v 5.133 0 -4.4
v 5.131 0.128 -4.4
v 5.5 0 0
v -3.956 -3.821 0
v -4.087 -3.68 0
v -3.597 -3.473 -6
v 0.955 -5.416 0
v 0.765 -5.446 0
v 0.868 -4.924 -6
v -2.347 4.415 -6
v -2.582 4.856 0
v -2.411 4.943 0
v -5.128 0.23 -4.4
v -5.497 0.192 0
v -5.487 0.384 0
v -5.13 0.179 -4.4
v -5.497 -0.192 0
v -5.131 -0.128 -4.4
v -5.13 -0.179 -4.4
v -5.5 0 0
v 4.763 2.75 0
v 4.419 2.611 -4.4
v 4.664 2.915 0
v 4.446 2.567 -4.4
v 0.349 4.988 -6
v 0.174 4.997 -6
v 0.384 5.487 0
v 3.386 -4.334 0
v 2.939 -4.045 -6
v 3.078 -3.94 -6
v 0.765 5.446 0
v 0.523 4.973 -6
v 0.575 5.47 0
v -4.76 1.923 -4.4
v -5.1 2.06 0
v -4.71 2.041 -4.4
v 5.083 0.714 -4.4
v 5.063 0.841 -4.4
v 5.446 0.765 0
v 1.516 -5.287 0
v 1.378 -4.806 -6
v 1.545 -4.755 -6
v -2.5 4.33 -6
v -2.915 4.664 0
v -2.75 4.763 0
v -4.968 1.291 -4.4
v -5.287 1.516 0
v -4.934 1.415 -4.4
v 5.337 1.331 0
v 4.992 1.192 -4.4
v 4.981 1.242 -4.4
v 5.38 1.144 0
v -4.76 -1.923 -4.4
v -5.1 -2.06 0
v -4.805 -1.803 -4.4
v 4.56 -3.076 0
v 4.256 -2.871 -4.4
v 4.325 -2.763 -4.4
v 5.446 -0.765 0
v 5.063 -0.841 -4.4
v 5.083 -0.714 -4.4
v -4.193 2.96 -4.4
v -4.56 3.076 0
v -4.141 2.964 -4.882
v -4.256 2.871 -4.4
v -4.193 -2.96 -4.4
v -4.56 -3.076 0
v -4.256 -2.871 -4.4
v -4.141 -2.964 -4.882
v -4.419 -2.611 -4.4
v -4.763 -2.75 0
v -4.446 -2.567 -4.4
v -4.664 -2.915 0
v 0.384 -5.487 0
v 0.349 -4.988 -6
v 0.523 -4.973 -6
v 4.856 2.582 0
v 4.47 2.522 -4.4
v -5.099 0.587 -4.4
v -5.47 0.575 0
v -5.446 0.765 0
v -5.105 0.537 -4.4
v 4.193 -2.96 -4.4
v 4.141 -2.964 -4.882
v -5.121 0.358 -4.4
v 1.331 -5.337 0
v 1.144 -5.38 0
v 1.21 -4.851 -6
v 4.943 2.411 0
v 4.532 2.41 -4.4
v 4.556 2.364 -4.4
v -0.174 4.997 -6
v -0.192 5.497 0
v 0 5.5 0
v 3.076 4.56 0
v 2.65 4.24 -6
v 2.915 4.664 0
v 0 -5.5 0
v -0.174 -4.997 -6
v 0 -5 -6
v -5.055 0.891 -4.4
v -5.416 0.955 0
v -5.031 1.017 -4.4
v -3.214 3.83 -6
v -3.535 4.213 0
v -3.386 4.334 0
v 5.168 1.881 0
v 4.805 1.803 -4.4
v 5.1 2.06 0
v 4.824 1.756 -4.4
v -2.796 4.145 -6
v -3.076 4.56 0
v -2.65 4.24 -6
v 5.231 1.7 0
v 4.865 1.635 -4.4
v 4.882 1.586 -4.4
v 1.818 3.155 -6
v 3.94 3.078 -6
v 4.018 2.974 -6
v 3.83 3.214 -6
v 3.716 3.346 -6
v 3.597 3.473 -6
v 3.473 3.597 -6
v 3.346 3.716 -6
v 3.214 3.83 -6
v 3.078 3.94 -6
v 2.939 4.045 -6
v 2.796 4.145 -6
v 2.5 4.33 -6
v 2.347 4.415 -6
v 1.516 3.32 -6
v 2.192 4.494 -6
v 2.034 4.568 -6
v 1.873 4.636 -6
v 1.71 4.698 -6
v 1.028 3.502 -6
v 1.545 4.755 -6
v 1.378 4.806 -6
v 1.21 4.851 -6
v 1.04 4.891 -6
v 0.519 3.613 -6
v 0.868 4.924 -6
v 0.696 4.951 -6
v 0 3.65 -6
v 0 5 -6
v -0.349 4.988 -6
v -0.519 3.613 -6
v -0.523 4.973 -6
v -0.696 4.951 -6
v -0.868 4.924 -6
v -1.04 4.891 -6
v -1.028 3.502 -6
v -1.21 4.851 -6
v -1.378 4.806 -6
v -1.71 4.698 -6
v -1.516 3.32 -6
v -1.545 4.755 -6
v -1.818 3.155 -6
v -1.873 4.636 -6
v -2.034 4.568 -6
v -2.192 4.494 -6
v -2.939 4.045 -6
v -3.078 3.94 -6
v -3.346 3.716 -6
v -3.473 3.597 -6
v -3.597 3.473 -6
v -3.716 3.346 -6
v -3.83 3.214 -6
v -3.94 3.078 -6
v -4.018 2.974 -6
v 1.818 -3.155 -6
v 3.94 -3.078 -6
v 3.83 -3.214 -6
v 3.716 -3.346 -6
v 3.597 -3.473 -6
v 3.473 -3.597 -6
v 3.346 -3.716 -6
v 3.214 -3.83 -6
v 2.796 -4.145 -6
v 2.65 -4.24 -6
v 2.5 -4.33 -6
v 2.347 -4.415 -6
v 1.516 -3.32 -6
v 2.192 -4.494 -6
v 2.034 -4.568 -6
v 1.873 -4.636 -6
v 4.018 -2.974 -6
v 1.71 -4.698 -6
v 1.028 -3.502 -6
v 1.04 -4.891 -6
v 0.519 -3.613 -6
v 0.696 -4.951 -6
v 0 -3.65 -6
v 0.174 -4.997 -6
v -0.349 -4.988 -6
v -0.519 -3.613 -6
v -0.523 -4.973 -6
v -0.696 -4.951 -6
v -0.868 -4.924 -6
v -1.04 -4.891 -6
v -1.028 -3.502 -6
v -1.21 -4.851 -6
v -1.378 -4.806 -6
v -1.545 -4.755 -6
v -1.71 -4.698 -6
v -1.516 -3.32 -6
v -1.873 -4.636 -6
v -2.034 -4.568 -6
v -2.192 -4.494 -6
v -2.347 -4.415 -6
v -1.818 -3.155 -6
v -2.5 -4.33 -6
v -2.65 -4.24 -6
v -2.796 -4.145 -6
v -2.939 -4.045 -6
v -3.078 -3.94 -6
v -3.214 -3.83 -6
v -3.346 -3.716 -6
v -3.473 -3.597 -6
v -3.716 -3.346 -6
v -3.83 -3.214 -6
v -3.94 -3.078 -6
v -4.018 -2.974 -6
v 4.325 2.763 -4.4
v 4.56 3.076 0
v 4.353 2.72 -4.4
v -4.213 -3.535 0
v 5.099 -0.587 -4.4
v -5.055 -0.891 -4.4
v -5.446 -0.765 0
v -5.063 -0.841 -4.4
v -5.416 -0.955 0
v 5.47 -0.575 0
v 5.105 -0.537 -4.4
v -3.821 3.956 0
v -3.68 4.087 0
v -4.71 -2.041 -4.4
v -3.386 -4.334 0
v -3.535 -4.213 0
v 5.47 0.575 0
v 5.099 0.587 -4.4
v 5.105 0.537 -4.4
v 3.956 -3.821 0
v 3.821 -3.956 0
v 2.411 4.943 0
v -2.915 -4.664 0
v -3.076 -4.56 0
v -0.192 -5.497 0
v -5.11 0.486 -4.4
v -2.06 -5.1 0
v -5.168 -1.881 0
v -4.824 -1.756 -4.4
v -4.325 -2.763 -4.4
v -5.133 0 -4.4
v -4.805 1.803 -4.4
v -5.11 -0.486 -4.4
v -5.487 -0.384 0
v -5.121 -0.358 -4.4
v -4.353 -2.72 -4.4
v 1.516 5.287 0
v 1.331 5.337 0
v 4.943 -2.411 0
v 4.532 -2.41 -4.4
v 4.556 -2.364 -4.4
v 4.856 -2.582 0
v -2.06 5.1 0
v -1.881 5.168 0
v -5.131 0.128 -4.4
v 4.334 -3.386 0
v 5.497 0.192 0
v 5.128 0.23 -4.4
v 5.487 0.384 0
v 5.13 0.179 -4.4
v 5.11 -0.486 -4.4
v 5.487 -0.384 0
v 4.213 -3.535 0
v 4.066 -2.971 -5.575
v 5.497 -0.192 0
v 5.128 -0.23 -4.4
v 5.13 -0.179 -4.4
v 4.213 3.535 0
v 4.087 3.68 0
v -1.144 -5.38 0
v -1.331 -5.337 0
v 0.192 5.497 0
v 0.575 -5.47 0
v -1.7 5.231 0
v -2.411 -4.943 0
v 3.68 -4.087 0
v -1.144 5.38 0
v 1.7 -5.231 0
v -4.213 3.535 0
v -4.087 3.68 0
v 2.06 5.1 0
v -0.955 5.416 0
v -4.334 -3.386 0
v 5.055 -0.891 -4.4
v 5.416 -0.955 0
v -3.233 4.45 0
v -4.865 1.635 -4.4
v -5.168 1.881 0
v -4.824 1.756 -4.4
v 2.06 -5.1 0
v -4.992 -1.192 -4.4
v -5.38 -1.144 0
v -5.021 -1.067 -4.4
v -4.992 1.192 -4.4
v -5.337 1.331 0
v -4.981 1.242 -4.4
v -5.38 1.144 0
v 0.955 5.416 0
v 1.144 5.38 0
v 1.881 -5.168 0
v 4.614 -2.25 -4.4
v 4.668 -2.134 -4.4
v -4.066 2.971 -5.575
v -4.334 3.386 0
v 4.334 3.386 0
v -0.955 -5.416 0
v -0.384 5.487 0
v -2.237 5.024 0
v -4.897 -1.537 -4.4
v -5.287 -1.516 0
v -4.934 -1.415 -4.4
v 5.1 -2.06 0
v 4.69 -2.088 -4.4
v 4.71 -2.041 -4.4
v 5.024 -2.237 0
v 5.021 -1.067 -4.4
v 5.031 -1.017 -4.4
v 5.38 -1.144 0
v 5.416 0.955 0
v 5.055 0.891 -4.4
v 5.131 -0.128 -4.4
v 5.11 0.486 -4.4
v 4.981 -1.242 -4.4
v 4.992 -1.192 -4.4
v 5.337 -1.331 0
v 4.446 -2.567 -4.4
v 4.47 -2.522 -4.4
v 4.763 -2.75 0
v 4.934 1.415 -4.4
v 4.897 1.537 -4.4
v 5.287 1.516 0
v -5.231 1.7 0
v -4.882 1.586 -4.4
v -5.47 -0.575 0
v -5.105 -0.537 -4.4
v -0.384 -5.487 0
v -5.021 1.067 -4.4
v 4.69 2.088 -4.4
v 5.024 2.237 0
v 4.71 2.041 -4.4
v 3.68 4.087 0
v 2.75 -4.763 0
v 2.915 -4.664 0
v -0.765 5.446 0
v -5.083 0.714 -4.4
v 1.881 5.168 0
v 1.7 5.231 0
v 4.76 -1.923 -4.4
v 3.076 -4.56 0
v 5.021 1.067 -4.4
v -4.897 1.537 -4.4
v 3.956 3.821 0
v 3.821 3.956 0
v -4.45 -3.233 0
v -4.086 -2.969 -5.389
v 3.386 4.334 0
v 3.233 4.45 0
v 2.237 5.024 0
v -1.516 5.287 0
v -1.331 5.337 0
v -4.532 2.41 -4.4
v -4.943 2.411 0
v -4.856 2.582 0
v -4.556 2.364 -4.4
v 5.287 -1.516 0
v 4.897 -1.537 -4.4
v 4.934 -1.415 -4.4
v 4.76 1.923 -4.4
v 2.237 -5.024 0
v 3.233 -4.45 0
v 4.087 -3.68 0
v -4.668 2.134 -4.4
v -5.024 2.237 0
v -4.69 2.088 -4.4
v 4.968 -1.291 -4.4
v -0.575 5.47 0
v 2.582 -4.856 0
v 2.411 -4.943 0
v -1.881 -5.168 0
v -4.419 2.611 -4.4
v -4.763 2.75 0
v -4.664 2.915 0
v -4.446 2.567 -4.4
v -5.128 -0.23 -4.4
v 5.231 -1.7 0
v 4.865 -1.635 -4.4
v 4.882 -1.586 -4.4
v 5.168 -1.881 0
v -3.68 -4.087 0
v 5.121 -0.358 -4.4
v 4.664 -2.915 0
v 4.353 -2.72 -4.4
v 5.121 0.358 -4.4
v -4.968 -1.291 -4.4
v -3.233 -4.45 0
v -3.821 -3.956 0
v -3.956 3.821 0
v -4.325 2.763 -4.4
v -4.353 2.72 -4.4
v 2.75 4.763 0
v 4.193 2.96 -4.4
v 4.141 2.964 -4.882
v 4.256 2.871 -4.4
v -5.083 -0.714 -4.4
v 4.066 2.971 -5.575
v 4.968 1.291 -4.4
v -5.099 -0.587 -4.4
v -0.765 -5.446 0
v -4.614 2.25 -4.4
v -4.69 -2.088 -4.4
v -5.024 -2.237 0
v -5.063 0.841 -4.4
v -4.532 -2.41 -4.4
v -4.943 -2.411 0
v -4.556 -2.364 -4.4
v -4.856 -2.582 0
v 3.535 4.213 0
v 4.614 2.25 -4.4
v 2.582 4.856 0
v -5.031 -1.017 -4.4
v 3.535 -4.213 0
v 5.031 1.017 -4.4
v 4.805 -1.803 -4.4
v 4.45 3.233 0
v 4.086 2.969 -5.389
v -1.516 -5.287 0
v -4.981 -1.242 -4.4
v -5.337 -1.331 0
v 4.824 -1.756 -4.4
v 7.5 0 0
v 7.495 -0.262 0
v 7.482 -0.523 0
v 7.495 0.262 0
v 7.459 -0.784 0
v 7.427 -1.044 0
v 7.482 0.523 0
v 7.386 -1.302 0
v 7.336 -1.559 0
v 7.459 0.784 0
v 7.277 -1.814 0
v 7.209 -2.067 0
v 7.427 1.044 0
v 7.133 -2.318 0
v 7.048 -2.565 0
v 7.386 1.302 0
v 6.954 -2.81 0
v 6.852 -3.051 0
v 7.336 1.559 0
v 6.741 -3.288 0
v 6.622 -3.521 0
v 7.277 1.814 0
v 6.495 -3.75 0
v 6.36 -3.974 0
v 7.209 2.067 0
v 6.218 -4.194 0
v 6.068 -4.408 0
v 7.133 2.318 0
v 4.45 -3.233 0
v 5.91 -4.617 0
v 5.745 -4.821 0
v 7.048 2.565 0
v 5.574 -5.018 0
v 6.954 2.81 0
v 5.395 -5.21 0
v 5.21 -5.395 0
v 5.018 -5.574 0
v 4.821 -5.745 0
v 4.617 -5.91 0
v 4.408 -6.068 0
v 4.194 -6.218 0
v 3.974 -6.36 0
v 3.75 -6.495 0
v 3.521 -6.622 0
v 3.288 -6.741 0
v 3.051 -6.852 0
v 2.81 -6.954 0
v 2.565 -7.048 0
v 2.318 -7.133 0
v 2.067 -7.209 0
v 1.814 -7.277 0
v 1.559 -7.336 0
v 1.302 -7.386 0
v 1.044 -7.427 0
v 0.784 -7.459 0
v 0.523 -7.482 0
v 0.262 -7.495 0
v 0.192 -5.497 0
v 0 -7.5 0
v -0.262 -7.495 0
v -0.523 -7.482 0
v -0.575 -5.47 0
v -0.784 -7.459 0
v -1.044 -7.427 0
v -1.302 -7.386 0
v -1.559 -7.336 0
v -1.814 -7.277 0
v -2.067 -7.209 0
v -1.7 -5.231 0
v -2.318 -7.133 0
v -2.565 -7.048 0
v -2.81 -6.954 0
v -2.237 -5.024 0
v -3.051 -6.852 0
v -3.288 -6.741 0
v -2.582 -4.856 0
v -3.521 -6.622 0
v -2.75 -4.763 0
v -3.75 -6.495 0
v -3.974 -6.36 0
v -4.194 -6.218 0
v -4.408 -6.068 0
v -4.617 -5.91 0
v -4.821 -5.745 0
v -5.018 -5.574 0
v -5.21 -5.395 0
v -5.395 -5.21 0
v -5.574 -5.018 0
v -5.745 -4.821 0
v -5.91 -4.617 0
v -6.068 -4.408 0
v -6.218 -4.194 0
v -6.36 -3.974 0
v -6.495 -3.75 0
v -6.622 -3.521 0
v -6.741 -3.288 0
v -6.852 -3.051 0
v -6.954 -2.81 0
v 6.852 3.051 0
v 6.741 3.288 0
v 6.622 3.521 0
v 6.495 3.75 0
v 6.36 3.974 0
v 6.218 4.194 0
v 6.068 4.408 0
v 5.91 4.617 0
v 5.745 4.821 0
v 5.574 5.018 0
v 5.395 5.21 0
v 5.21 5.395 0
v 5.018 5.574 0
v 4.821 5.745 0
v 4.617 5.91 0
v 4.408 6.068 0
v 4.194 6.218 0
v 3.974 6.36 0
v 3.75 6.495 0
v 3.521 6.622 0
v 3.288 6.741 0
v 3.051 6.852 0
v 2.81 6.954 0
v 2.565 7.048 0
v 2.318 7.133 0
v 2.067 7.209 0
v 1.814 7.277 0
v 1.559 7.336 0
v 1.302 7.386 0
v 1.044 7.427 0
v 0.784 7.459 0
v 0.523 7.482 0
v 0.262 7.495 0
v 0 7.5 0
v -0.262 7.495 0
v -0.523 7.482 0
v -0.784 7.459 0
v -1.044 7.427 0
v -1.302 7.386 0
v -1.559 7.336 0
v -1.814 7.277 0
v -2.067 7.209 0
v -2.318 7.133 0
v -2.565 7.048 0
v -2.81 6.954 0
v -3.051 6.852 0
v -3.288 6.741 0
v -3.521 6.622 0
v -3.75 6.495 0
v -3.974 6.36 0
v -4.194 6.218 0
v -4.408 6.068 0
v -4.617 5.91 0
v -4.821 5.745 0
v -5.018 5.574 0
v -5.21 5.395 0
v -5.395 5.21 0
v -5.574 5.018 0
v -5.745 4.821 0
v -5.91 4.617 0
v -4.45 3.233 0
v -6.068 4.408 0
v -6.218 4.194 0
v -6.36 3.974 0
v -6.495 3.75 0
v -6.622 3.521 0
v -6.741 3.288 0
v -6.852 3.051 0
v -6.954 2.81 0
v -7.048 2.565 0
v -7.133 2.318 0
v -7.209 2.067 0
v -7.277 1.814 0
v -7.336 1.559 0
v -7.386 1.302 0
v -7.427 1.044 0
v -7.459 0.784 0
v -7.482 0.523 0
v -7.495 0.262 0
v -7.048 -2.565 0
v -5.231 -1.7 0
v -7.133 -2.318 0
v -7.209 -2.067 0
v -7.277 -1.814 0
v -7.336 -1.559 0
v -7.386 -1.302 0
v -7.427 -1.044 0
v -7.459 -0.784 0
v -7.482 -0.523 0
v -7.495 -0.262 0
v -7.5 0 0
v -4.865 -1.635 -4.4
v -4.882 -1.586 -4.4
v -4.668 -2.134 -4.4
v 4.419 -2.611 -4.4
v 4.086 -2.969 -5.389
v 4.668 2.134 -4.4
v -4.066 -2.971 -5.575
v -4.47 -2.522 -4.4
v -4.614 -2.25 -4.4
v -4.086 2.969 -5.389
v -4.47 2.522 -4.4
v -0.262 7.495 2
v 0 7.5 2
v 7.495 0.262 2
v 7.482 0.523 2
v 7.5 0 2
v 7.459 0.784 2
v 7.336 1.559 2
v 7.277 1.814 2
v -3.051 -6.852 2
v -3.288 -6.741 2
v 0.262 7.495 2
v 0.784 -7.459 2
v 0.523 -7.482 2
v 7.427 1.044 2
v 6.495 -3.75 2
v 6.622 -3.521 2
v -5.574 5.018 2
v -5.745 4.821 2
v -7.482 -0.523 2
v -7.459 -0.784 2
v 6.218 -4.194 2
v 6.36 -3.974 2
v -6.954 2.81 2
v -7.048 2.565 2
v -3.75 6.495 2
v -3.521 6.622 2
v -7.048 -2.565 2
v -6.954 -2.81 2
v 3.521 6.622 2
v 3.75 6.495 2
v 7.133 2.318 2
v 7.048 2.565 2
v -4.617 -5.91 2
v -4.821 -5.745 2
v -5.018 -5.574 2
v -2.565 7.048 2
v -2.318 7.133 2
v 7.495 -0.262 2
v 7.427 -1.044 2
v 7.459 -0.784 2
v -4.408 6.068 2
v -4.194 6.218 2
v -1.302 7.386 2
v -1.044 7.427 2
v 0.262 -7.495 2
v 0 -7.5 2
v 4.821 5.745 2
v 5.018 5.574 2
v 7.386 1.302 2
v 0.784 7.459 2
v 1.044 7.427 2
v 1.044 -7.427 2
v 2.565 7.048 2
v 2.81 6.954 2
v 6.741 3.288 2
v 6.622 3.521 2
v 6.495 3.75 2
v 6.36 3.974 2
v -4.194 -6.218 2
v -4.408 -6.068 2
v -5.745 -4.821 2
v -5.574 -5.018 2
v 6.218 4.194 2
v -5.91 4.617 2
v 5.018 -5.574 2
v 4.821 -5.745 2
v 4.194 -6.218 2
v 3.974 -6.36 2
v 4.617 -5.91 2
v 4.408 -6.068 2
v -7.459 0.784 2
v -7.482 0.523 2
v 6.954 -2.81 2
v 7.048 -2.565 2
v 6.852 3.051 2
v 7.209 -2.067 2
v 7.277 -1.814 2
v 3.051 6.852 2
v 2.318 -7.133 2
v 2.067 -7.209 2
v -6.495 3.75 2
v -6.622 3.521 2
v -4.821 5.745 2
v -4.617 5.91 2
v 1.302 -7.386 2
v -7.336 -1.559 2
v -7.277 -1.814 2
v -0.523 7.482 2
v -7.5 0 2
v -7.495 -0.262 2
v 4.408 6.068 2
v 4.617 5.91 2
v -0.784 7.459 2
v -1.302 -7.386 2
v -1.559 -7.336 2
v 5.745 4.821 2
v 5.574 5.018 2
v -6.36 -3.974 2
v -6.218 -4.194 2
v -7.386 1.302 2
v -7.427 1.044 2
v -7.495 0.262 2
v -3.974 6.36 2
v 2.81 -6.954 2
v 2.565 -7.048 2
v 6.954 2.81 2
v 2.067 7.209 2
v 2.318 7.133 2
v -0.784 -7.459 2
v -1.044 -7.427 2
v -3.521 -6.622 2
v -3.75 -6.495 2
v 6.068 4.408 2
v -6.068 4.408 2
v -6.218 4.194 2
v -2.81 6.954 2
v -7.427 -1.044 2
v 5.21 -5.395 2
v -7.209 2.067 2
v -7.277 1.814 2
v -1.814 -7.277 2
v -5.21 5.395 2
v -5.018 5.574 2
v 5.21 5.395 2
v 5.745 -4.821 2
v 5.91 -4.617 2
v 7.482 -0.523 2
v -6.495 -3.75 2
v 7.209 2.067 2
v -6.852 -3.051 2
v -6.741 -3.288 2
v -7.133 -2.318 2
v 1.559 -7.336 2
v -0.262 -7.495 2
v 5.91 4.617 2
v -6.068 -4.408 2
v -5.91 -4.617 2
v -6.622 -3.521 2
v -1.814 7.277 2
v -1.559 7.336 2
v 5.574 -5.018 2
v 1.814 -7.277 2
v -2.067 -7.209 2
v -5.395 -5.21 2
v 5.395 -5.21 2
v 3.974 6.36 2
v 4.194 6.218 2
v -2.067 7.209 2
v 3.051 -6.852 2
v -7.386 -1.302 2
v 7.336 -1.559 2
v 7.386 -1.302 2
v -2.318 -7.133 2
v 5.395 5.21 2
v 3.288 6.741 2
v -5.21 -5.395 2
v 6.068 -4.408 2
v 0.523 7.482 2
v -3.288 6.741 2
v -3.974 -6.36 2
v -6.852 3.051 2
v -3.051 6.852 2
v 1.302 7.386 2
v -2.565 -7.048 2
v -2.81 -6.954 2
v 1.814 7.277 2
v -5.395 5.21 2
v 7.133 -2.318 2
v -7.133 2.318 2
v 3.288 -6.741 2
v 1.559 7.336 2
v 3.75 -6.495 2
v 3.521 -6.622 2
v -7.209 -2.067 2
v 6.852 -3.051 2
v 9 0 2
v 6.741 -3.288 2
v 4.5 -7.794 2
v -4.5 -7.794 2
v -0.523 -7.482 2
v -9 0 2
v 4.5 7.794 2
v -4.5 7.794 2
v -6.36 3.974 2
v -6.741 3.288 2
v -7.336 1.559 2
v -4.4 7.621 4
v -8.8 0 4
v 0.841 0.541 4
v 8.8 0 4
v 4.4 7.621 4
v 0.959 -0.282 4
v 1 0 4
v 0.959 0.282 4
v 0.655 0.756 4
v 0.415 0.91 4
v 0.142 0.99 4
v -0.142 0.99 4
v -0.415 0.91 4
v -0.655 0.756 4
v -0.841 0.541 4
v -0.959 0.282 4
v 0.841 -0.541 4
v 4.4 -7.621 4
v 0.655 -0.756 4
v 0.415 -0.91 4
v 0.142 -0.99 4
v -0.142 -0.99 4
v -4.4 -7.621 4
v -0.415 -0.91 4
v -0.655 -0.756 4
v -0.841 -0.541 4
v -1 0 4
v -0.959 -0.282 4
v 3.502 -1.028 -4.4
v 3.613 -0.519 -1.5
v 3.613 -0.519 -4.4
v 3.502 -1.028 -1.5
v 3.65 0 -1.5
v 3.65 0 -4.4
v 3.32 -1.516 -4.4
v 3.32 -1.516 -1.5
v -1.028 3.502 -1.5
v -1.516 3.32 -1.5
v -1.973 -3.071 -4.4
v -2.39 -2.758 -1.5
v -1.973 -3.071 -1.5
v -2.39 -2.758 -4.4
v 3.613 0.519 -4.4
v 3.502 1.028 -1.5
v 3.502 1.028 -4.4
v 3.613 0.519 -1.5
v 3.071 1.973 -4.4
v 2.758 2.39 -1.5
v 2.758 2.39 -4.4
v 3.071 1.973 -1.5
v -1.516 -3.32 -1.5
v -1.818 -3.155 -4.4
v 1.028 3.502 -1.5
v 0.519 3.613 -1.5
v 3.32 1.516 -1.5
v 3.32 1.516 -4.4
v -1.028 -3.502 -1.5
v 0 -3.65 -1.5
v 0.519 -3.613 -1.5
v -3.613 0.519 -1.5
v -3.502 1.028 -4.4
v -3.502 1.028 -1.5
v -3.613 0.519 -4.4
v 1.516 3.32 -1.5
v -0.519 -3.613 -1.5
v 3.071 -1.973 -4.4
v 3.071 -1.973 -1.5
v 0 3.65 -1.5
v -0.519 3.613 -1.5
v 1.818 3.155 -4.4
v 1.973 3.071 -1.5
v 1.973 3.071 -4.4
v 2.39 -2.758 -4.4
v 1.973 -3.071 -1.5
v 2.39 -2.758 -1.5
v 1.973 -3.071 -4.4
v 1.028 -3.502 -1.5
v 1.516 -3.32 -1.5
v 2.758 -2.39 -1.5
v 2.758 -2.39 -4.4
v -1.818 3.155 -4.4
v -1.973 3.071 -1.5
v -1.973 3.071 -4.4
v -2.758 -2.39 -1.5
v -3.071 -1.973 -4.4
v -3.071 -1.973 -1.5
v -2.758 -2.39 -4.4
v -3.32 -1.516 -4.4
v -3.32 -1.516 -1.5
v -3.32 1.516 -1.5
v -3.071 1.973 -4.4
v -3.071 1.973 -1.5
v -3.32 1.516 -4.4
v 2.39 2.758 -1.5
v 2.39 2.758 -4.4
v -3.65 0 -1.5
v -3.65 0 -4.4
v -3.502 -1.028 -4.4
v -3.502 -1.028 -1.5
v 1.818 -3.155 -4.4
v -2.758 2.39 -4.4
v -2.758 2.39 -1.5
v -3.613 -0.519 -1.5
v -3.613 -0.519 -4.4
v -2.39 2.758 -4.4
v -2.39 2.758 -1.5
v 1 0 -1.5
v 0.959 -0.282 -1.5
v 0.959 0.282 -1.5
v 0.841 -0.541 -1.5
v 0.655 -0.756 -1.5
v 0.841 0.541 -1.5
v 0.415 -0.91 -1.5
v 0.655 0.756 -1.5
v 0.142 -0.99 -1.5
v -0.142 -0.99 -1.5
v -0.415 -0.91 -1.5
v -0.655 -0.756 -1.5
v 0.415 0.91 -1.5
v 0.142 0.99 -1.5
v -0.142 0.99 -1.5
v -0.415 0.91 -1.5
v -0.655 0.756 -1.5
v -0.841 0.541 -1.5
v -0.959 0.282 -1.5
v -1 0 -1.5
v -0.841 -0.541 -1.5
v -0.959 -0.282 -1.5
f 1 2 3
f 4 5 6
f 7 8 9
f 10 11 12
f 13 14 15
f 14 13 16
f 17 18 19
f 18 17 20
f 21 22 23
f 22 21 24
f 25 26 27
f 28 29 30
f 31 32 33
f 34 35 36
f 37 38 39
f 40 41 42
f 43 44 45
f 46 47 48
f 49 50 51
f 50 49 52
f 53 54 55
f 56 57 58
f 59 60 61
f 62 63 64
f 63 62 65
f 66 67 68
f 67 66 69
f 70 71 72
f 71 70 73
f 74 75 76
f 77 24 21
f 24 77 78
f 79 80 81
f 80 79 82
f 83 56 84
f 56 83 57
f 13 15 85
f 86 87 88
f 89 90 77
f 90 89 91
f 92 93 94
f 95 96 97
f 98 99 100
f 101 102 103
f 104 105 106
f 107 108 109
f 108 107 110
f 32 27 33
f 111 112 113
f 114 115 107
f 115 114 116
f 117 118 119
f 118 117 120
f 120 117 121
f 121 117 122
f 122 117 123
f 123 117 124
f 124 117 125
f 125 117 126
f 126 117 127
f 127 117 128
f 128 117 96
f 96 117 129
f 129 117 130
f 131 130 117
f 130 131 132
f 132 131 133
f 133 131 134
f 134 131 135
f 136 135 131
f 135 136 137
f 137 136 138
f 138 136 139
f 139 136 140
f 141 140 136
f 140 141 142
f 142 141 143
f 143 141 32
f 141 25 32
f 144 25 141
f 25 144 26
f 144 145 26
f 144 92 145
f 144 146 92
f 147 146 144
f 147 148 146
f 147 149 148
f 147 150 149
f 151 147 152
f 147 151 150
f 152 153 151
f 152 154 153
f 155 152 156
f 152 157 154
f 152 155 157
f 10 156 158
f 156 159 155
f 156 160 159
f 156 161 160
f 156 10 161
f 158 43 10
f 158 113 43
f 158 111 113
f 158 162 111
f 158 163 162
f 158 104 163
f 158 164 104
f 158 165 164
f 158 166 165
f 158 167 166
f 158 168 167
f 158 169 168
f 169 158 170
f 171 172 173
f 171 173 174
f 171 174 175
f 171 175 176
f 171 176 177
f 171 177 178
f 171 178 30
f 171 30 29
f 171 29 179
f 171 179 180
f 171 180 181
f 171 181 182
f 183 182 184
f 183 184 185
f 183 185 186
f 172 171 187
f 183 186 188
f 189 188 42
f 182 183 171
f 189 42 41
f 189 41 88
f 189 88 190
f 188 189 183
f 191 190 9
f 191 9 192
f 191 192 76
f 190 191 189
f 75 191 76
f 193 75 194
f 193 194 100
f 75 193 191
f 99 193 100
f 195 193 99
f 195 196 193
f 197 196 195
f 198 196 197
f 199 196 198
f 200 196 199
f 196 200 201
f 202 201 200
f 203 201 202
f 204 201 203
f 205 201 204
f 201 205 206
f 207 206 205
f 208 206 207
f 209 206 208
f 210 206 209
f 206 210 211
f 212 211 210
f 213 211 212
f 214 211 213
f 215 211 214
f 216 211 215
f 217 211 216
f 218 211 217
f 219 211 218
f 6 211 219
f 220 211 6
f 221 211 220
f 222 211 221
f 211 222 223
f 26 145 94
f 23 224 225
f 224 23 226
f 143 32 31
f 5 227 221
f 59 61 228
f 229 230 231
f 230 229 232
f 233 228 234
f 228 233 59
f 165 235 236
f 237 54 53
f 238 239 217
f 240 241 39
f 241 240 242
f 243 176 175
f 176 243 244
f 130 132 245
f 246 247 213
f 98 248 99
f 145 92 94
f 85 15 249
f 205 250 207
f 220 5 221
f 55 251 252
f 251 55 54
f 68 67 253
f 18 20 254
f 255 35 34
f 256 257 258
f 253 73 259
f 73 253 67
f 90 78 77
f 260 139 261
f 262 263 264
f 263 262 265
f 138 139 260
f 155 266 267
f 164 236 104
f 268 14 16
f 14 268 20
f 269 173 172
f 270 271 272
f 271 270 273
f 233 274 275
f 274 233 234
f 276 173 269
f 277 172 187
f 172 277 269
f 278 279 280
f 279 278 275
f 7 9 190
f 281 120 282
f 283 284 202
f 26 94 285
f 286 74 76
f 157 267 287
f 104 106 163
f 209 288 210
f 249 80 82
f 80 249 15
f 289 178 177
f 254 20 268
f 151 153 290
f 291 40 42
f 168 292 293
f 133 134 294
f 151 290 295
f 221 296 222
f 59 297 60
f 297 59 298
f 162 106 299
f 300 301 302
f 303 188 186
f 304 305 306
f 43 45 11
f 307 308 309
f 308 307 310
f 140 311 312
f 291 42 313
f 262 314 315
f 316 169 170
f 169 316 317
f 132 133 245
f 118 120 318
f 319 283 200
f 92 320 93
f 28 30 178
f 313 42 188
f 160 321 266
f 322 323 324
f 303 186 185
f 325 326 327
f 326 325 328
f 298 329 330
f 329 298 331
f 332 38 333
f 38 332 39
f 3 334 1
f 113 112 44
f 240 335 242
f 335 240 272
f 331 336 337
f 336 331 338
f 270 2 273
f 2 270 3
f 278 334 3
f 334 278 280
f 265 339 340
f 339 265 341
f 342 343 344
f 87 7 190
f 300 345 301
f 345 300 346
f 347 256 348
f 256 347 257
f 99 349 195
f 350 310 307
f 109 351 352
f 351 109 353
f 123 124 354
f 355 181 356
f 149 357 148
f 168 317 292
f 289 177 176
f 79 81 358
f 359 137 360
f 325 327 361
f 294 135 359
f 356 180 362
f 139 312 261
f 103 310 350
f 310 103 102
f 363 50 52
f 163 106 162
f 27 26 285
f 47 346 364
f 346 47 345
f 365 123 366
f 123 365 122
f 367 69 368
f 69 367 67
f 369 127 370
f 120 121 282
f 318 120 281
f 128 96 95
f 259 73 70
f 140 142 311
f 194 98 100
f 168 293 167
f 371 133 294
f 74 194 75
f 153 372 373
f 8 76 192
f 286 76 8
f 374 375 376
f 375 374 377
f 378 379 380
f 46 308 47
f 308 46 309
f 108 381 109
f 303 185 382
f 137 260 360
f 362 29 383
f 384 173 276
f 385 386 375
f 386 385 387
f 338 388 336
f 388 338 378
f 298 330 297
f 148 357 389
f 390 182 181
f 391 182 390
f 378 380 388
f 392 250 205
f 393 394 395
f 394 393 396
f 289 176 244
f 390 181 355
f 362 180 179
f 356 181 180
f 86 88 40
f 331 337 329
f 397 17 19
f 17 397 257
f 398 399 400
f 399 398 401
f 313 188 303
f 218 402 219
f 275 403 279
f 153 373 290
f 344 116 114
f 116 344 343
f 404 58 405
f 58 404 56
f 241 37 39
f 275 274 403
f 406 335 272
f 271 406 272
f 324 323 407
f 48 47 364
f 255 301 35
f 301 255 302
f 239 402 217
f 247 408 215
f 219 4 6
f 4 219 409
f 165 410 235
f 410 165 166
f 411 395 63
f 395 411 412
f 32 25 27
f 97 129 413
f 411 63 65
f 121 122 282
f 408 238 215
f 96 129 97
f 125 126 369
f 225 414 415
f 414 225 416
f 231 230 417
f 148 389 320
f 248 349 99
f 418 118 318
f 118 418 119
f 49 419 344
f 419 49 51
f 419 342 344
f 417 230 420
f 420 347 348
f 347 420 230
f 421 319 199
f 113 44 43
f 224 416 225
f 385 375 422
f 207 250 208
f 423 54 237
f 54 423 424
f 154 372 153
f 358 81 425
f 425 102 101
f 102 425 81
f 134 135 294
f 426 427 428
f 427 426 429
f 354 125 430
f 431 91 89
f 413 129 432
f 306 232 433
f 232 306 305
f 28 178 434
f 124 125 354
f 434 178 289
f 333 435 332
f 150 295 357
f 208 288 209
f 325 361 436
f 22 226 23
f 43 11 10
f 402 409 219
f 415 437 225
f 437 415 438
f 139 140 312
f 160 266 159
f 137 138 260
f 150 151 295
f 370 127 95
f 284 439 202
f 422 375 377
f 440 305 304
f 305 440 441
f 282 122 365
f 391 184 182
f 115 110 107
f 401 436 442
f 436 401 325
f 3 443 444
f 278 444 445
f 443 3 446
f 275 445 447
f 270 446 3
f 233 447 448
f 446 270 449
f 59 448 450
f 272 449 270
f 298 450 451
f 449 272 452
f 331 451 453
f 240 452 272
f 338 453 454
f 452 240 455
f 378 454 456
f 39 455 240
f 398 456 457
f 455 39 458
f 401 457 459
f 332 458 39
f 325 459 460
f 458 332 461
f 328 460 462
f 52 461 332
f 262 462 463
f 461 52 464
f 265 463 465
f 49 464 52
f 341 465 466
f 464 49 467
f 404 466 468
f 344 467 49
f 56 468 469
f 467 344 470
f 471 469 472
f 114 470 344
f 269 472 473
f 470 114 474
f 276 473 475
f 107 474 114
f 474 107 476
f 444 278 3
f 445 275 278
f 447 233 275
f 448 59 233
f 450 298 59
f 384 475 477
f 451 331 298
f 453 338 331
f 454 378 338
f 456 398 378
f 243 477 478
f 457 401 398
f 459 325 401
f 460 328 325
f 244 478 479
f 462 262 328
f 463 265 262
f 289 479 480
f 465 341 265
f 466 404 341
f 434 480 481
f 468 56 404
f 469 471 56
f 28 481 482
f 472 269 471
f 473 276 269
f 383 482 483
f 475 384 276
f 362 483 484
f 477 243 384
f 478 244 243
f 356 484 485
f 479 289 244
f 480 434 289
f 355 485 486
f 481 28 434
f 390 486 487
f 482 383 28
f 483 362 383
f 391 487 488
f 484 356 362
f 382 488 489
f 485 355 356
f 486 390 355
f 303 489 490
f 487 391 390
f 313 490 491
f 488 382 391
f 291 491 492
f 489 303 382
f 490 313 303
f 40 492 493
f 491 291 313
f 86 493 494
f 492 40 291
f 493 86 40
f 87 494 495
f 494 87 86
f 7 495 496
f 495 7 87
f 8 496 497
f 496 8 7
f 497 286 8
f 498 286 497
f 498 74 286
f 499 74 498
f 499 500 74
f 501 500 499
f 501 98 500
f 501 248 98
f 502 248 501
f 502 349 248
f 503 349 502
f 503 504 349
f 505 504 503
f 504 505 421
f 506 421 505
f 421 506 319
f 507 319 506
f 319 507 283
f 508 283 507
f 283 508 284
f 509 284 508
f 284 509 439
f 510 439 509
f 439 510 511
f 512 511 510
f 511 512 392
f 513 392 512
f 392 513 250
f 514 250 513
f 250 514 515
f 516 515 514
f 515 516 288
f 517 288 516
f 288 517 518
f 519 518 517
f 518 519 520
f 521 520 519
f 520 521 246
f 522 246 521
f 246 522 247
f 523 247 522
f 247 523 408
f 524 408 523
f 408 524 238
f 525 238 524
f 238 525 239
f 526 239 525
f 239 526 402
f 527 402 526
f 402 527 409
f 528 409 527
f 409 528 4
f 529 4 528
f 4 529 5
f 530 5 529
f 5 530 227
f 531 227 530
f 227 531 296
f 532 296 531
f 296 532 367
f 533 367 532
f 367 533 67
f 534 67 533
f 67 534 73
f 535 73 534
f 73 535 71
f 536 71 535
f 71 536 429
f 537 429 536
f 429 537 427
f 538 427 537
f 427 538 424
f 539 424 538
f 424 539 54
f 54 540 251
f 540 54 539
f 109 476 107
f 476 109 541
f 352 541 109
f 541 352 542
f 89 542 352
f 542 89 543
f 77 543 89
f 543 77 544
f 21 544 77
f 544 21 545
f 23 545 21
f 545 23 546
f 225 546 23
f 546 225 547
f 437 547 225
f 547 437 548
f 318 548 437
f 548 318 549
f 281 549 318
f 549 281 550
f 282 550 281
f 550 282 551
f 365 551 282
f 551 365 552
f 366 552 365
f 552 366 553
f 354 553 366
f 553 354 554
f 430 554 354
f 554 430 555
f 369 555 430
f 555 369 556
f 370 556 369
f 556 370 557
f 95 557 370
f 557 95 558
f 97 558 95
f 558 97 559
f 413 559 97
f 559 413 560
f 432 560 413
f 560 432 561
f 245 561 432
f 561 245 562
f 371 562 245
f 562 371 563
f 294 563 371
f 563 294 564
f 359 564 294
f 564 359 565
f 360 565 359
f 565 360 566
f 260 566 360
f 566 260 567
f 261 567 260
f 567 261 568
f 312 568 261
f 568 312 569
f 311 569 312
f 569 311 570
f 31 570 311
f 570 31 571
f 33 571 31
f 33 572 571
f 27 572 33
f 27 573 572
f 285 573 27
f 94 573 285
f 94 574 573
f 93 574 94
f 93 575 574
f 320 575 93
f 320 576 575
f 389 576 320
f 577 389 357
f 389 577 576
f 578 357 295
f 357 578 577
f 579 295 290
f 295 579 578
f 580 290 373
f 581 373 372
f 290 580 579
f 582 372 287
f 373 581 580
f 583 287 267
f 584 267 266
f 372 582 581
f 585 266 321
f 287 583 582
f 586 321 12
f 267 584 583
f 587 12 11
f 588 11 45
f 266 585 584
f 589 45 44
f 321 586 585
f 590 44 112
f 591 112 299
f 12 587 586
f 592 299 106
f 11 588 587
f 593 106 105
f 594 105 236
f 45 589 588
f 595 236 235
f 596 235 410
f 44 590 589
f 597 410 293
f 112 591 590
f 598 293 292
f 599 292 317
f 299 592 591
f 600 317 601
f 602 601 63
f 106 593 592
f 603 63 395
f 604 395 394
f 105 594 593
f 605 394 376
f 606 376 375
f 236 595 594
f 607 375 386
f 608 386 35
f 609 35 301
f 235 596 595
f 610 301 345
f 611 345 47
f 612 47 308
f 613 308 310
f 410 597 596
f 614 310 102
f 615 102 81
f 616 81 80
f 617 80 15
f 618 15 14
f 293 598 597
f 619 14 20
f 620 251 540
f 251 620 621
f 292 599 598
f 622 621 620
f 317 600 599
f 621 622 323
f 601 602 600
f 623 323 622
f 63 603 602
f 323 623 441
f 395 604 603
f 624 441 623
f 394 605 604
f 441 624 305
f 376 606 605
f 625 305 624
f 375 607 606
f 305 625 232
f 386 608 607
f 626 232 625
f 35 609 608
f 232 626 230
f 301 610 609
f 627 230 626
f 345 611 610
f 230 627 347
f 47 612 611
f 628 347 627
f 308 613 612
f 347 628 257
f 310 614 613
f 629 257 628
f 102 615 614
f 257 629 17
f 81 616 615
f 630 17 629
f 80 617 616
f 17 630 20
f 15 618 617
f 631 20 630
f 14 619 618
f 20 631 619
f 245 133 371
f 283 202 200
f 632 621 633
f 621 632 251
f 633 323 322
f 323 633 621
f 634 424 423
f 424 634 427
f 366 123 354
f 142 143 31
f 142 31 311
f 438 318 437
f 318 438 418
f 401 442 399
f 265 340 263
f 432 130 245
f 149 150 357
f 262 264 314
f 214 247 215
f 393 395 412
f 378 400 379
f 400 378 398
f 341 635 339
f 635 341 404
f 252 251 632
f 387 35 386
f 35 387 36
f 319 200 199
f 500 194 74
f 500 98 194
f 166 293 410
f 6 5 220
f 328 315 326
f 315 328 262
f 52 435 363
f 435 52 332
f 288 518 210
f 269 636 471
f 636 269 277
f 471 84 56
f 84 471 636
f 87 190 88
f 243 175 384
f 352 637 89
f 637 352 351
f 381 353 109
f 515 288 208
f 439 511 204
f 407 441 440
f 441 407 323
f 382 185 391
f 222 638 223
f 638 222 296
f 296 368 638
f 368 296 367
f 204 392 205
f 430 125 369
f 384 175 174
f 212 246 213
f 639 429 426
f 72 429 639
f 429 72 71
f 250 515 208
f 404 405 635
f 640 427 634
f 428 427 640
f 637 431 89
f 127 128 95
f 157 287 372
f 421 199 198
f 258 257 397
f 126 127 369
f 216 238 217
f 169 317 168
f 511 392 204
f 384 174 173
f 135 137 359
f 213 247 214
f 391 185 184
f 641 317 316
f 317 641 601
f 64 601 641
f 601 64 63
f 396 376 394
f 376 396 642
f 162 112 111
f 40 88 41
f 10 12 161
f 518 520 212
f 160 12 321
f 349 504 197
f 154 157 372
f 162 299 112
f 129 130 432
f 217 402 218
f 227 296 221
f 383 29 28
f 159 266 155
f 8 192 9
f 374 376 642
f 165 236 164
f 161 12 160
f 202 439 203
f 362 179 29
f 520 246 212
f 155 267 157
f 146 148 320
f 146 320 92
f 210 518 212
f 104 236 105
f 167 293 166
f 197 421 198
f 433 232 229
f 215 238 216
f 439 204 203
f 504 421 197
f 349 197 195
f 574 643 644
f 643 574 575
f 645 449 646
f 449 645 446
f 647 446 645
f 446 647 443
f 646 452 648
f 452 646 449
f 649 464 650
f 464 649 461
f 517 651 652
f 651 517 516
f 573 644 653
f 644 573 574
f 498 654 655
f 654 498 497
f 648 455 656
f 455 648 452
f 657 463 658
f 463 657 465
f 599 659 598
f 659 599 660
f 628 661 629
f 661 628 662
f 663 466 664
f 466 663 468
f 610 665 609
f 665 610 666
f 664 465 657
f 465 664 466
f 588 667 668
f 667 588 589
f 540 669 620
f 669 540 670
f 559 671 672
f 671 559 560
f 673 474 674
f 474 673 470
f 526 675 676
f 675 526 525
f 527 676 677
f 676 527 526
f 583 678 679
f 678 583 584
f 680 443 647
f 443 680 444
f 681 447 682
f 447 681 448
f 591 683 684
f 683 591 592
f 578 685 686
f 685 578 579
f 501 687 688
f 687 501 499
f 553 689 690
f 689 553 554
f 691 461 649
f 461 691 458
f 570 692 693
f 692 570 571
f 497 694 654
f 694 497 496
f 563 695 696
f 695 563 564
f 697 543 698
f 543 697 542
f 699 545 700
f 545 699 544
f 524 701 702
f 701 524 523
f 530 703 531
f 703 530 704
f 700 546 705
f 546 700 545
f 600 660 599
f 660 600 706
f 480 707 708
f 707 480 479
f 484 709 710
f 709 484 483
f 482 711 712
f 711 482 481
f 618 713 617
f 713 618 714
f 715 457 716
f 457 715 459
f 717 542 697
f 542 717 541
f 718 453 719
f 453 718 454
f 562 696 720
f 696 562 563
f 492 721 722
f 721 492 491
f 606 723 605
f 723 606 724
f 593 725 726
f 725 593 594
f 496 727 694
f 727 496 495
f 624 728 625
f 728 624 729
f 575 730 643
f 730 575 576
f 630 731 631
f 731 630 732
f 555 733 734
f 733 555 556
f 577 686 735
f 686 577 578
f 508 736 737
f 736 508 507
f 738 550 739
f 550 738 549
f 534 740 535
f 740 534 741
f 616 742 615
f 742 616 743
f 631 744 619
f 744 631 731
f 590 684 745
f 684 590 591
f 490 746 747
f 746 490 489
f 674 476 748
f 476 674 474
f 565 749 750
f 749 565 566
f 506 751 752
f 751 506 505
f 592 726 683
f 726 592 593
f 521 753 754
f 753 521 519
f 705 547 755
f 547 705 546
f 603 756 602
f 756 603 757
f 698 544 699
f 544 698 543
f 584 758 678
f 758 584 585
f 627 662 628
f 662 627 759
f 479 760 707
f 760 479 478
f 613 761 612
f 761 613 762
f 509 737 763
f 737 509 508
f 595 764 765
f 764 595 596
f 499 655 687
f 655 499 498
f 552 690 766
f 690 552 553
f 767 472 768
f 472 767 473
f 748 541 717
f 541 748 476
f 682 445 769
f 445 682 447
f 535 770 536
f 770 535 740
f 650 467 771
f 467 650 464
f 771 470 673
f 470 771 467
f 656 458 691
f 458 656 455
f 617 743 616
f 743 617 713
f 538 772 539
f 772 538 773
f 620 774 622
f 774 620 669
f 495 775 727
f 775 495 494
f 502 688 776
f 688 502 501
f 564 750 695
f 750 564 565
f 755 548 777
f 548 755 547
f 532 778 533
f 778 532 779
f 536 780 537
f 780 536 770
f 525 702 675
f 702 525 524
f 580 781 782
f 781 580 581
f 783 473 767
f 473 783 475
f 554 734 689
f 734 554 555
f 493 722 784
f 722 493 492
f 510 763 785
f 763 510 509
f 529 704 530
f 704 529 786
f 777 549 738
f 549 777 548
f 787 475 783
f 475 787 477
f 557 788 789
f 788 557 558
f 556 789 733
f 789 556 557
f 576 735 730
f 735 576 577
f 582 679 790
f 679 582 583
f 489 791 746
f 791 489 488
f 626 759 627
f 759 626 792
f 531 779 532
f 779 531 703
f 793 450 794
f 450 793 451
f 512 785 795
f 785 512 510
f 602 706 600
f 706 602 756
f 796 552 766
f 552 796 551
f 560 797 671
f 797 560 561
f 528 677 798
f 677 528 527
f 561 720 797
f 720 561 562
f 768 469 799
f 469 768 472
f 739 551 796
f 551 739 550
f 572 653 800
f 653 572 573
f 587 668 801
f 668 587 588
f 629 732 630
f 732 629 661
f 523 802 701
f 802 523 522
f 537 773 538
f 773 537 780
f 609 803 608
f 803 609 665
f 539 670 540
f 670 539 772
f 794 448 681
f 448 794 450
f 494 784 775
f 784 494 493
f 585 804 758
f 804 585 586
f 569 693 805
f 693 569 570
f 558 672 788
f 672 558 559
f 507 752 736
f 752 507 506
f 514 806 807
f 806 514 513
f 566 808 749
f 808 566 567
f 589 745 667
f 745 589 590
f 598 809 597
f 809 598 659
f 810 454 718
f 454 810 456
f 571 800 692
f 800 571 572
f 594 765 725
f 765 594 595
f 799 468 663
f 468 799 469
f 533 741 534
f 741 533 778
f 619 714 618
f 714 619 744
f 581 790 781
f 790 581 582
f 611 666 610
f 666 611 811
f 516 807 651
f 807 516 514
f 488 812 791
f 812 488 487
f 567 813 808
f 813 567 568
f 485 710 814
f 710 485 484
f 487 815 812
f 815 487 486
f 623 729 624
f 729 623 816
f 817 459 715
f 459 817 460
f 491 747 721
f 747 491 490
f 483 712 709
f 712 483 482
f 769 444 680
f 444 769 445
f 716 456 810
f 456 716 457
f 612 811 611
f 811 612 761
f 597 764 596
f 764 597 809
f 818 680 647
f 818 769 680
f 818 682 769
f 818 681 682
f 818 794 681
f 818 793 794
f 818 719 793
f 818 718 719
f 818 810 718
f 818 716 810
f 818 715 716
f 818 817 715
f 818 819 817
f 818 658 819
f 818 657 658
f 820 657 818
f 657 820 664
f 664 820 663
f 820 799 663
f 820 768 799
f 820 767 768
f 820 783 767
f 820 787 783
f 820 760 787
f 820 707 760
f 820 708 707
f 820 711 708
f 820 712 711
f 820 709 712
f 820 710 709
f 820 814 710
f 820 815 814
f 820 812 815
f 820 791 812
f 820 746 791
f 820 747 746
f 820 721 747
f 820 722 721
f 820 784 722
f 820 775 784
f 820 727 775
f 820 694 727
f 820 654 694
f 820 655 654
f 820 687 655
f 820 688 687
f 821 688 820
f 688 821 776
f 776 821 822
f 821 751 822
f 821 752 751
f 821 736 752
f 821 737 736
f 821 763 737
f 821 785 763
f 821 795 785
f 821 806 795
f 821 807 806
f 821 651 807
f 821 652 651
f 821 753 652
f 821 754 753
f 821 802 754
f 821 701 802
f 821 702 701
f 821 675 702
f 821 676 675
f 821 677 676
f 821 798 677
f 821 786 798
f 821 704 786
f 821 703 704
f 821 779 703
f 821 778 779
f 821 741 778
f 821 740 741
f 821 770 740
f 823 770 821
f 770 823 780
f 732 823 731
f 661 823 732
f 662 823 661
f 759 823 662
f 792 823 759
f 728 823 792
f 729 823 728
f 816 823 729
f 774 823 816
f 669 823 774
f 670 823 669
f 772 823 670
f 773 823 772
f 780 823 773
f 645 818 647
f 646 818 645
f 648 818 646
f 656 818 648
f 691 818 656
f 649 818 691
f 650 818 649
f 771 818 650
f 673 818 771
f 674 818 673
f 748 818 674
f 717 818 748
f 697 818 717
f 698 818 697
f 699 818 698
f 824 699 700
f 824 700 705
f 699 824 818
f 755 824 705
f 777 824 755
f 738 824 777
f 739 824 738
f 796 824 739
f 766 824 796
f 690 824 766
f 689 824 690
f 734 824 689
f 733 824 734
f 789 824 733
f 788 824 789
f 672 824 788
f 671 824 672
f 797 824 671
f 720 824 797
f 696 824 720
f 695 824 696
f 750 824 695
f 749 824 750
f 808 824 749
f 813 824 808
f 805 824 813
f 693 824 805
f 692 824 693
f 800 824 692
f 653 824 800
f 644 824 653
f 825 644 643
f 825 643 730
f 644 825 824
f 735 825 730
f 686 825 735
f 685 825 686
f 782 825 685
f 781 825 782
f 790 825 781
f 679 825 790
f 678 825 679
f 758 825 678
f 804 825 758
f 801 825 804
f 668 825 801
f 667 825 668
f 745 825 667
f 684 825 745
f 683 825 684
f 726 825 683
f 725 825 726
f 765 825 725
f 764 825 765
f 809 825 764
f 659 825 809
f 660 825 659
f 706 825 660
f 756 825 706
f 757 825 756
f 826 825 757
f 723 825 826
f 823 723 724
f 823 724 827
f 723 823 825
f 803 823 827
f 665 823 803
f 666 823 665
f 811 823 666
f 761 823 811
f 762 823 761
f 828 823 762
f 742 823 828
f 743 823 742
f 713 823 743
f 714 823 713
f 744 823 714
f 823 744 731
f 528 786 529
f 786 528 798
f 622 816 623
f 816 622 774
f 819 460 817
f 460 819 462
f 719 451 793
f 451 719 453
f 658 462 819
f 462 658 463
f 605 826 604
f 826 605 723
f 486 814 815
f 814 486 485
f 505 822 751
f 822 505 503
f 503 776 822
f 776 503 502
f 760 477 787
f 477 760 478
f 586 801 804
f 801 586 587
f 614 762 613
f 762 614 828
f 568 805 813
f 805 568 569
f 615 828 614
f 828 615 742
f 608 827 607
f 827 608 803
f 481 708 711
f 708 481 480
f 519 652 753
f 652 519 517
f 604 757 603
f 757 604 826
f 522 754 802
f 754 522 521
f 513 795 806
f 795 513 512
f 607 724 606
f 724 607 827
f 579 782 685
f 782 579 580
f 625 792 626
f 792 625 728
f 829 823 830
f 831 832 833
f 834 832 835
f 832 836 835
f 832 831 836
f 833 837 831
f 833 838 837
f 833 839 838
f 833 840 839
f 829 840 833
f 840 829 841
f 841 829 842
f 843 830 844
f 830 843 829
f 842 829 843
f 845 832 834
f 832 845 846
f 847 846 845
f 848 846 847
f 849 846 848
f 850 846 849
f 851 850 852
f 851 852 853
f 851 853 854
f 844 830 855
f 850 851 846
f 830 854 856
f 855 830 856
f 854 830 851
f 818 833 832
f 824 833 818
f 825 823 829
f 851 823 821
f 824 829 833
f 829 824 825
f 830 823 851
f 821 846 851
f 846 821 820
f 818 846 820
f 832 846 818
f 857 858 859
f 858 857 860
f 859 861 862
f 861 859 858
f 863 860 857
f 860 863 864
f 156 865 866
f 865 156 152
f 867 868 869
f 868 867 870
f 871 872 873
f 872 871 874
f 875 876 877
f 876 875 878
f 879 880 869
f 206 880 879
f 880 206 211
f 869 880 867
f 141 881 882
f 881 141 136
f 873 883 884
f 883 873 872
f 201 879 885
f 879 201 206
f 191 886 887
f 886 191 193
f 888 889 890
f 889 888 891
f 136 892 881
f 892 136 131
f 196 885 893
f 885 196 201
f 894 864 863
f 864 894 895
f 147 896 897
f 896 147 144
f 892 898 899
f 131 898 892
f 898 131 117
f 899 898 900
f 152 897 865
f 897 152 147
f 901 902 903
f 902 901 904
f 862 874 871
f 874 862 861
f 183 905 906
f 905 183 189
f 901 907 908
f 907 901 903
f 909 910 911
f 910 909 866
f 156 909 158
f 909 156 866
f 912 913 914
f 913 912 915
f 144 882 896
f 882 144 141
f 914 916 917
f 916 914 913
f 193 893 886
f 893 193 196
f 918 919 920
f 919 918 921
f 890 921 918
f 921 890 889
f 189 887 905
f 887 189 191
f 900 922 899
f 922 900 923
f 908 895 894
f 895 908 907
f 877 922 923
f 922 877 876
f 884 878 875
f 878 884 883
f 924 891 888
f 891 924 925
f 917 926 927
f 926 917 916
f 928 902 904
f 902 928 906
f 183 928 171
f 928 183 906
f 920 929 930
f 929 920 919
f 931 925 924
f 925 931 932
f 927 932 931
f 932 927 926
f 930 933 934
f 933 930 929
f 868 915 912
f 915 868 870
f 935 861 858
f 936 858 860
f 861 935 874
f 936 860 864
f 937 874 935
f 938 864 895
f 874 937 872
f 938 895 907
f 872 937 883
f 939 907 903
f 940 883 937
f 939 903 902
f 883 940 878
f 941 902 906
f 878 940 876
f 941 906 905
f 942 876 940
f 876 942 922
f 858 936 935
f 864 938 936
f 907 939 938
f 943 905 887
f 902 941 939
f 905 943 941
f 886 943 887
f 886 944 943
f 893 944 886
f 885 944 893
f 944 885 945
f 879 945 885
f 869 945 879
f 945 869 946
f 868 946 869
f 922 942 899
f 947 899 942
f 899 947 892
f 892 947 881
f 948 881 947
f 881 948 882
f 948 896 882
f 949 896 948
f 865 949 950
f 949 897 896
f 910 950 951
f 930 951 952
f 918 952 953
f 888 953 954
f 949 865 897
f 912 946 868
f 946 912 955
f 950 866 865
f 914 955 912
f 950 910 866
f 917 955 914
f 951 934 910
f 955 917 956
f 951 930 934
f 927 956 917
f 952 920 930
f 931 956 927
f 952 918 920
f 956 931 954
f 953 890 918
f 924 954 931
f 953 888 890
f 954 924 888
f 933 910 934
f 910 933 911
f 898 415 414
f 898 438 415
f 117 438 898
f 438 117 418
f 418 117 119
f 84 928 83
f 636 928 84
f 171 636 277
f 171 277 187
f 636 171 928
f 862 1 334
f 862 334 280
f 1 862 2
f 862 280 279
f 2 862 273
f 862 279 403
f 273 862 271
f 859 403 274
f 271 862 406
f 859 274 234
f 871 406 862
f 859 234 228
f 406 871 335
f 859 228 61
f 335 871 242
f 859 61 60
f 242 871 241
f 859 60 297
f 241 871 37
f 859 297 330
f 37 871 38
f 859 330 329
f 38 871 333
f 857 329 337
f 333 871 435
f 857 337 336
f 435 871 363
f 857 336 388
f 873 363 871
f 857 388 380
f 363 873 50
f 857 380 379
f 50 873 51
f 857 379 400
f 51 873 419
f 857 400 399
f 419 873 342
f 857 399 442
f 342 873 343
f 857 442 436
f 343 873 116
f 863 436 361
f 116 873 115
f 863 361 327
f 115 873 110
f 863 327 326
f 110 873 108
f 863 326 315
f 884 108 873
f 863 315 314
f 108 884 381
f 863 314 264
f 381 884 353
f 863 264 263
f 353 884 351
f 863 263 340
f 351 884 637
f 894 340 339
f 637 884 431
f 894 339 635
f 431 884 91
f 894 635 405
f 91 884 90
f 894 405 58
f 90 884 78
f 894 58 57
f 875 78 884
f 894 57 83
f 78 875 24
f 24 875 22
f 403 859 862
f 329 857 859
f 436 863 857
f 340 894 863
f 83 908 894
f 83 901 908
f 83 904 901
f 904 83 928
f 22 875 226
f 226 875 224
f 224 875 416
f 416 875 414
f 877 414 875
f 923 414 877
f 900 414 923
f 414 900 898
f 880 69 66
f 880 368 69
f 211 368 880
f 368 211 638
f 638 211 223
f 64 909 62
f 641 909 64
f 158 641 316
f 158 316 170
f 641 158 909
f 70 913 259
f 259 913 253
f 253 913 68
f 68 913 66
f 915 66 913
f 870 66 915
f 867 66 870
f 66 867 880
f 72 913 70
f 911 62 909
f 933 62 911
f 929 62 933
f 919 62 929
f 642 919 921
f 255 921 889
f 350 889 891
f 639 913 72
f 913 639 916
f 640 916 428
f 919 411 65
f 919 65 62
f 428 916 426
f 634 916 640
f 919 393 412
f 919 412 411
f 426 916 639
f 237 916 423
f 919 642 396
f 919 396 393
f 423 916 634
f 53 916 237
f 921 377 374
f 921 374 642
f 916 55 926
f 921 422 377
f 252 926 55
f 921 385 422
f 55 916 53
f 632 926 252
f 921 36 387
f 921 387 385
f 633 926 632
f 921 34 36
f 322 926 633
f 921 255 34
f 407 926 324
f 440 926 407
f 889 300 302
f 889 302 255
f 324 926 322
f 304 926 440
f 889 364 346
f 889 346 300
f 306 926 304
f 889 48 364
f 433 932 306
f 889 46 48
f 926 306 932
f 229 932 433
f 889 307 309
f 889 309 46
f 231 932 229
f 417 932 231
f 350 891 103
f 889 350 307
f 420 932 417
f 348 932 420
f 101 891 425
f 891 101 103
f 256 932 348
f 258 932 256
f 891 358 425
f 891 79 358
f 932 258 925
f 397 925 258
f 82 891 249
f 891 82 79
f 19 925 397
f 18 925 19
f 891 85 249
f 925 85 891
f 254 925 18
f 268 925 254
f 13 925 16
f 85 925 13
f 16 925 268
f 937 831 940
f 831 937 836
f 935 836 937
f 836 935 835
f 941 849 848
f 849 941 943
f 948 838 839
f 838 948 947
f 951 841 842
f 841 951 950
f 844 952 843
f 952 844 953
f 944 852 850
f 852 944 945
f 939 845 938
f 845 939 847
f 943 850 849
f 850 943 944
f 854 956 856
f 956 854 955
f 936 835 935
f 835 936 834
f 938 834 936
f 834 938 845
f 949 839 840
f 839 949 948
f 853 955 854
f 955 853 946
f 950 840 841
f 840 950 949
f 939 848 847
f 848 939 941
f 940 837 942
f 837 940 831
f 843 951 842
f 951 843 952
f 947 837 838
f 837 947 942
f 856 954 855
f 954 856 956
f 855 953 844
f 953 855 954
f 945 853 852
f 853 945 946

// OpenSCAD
// armSingle for sg92r micro servo

//------------------------------------------
// arm1
module arm1(
holes=1
){
difference(){
    union(){
        // Boss
        cylinder(r=3.55,h=4.75,$fn=44);
        // arm
        hull(){
            translate([0,0,4.75-1.85])
            cylinder(r=3.2,h=1.85,$fn=22);

            translate([14,0,4.75-1.85])
            cylinder(r=3.9/2,h=1.85,$fn=22);
        }
    }

    // bottom cut
    cylinder(r=2.2,h=3.0,$fn=22);
    // thru cut
    cylinder(r=1.1,h=5,$fn=22);
    // top cut
    translate([0,0,4.75-1.0])
    cylinder(r=2.32,h=1,$fn=44);
    
    // holes in the arm
    if(holes==1){
    for(i=[0:5])
    translate([4.7+i*9.75/5,0,4.75-1.85])
    cylinder(r=0.4,h=2,$fn=22);
}
}
} // ---------- end module arm1 -------

//------------------------------------------
// disk1
module disk1(
holes=1,
tol=0
){
difference(){
    union(){
        // Boss
        cylinder(r=3.55+tol,h=4.75+tol,$fn=44);
        // arm
        
        translate([0,0,4.75-1.85+tol])
        cylinder(r=23.6/2+tol,h=1.6+tol,$fn=44);
    }

    // bottom cut
    cylinder(r=2.2,h=3.0,$fn=22);
    // thru cut
    cylinder(r=1.1,h=5,$fn=22);
    // top cut
    translate([0,0,4.75-1.0])
    cylinder(r=2.32,h=1,$fn=44);
    
    if(holes==1){
    // holes in the arm
    for(i=[0:2])
        rotate([0,0,i*15])
    translate([8.5,0,4.75-1.85])
    cylinder(r=0.4,h=2,$fn=22);

    for(i=[0:2])
        rotate([0,0,180+i*15])
    translate([8.5,0,4.75-1.85])
    cylinder(r=0.4,h=2,$fn=22);

    for(i=[0:2])
        rotate([0,0,90+i*15])
    translate([7.5,0,4.75-1.85])
    cylinder(r=0.4,h=2,$fn=22);

    for(i=[0:2])
        rotate([0,0,90+i*15])
    translate([10,0,4.75-1.85])
    cylinder(r=0.4,h=2,$fn=22);
    for(i=[0:2])

        rotate([0,0,270+i*15])
    translate([7.5,0,4.75-1.85])
    cylinder(r=0.4,h=2,$fn=22);

    for(i=[0:2])
        rotate([0,0,270+i*15])
    translate([10,0,4.75-1.85])
    cylinder(r=0.4,h=2,$fn=22);
}
}
} // ---------- end module arm1 -------

//------------------------------------------
// arm2
module arm2(){
difference(){
    union(){
        // Boss
        cylinder(r=3.55,h=4.75,$fn=44);
        // arm
        hull(){
            translate([0,0,4.75-1.85])
            cylinder(r=3.2,h=1.85,$fn=22);

            translate([14,0,4.75-1.85])
            cylinder(r=3.9/2,h=1.85,$fn=22);
        }
        // arm
        hull(){
            translate([0,0,4.75-1.85])
            cylinder(r=3.2,h=1.85,$fn=22);

            translate([-14,0,4.75-1.85])
            cylinder(r=3.9/2,h=1.85,$fn=22);
        }
    }

    // bottom cut
    cylinder(r=2.2,h=3.0,$fn=22);
    // thru cut
    cylinder(r=1.1,h=5,$fn=22);
    // top cut
    translate([0,0,4.75-1.0])
    cylinder(r=2.32,h=1,$fn=44);
    
    // holes in the arm
    for(i=[0:5])
    translate([4.7+i*9.75/5,0,4.75-1.85])
    cylinder(r=0.4,h=2,$fn=22);

    for(i=[0:5])
    translate([-4.7-i*9.75/5,0,4.75-1.85])
    cylinder(r=0.4,h=2,$fn=22);
}
} // ---------- end module arm1 -------

// arm1cut
module arm1cut(tol=0.1){
difference(){
    union(){
        // Boss
        cylinder(r=3.55+tol/2,h=4.75+tol,$fn=44);
        // arm
        hull(){
            translate([0,0,4.75-1.85])
            cylinder(r=3.2+tol/2,h=1.85+tol,$fn=22);

            translate([14,0,4.75-1.85])
            cylinder(r=3.9/2+tol,h=1.85,$fn=22);
        }
    }

    // bottom cut if needed
//    cylinder(r=2.2-tol/2,h=3.0-tol,$fn=22);
}
} 

//---------------------------
module disk3(tol=0.0){
difference(){
union(){
    // taper
    translate([0,0,-6])
    cylinder(r1=5+tol,r2=5.5+tol,h=6+tol,$fn=180);
    // rolling surface
    cylinder(r=7.5+tol,h=2+tol,$fn=180);
    // nut
    translate([0,0,2])
    cylinder(r1=9+tol,r2=9-0.2+tol,h=2.0+tol,$fn=6);
}

    translate([0,0,-1.5])
    rotate([180,0,0])
    arm1cut(tol=0.2);

    translate([0,0,-1.5])
    rotate([0,0,180])
    rotate([180,0,0])
    arm1cut(tol=0.2);

    // center hole for a screw
    cylinder(r=1.0,h=10,center=true,$fn=22);
}
}

//---------------------------
// DEPRECATED
module disk3cut(tol=0.1){
    translate([0,0,-4-tol])
    cylinder(r1=8+tol,r2=8.5+tol,h=4+tol,$fn=180);

    cylinder(r=12+tol,h=1+tol,$fn=180);
    
    translate([0,0,1])
//    rotate([0,0,30])
//    cylinder(r=5+tol,h=2.5+tol,$fn=6);
    cylinder(r1=5.2+tol,r2=5+tol,h=2.5+tol,$fn=6);
}

//---------------------------
/*
difference(){
arm1cut();
arm1();
}


translate([0,-20,0])
arm2();

translate([0,15,0])
arm1cut();

translate([0,40,0])
//translate([0,-30,0])
//disk3();

disk1();

/*
difference(){
disk3(tol=0.1);
disk3();
}
*/


disk3();

//translate([0,70,0])
//difference(){
//disk3cut();
//disk3();
//}
